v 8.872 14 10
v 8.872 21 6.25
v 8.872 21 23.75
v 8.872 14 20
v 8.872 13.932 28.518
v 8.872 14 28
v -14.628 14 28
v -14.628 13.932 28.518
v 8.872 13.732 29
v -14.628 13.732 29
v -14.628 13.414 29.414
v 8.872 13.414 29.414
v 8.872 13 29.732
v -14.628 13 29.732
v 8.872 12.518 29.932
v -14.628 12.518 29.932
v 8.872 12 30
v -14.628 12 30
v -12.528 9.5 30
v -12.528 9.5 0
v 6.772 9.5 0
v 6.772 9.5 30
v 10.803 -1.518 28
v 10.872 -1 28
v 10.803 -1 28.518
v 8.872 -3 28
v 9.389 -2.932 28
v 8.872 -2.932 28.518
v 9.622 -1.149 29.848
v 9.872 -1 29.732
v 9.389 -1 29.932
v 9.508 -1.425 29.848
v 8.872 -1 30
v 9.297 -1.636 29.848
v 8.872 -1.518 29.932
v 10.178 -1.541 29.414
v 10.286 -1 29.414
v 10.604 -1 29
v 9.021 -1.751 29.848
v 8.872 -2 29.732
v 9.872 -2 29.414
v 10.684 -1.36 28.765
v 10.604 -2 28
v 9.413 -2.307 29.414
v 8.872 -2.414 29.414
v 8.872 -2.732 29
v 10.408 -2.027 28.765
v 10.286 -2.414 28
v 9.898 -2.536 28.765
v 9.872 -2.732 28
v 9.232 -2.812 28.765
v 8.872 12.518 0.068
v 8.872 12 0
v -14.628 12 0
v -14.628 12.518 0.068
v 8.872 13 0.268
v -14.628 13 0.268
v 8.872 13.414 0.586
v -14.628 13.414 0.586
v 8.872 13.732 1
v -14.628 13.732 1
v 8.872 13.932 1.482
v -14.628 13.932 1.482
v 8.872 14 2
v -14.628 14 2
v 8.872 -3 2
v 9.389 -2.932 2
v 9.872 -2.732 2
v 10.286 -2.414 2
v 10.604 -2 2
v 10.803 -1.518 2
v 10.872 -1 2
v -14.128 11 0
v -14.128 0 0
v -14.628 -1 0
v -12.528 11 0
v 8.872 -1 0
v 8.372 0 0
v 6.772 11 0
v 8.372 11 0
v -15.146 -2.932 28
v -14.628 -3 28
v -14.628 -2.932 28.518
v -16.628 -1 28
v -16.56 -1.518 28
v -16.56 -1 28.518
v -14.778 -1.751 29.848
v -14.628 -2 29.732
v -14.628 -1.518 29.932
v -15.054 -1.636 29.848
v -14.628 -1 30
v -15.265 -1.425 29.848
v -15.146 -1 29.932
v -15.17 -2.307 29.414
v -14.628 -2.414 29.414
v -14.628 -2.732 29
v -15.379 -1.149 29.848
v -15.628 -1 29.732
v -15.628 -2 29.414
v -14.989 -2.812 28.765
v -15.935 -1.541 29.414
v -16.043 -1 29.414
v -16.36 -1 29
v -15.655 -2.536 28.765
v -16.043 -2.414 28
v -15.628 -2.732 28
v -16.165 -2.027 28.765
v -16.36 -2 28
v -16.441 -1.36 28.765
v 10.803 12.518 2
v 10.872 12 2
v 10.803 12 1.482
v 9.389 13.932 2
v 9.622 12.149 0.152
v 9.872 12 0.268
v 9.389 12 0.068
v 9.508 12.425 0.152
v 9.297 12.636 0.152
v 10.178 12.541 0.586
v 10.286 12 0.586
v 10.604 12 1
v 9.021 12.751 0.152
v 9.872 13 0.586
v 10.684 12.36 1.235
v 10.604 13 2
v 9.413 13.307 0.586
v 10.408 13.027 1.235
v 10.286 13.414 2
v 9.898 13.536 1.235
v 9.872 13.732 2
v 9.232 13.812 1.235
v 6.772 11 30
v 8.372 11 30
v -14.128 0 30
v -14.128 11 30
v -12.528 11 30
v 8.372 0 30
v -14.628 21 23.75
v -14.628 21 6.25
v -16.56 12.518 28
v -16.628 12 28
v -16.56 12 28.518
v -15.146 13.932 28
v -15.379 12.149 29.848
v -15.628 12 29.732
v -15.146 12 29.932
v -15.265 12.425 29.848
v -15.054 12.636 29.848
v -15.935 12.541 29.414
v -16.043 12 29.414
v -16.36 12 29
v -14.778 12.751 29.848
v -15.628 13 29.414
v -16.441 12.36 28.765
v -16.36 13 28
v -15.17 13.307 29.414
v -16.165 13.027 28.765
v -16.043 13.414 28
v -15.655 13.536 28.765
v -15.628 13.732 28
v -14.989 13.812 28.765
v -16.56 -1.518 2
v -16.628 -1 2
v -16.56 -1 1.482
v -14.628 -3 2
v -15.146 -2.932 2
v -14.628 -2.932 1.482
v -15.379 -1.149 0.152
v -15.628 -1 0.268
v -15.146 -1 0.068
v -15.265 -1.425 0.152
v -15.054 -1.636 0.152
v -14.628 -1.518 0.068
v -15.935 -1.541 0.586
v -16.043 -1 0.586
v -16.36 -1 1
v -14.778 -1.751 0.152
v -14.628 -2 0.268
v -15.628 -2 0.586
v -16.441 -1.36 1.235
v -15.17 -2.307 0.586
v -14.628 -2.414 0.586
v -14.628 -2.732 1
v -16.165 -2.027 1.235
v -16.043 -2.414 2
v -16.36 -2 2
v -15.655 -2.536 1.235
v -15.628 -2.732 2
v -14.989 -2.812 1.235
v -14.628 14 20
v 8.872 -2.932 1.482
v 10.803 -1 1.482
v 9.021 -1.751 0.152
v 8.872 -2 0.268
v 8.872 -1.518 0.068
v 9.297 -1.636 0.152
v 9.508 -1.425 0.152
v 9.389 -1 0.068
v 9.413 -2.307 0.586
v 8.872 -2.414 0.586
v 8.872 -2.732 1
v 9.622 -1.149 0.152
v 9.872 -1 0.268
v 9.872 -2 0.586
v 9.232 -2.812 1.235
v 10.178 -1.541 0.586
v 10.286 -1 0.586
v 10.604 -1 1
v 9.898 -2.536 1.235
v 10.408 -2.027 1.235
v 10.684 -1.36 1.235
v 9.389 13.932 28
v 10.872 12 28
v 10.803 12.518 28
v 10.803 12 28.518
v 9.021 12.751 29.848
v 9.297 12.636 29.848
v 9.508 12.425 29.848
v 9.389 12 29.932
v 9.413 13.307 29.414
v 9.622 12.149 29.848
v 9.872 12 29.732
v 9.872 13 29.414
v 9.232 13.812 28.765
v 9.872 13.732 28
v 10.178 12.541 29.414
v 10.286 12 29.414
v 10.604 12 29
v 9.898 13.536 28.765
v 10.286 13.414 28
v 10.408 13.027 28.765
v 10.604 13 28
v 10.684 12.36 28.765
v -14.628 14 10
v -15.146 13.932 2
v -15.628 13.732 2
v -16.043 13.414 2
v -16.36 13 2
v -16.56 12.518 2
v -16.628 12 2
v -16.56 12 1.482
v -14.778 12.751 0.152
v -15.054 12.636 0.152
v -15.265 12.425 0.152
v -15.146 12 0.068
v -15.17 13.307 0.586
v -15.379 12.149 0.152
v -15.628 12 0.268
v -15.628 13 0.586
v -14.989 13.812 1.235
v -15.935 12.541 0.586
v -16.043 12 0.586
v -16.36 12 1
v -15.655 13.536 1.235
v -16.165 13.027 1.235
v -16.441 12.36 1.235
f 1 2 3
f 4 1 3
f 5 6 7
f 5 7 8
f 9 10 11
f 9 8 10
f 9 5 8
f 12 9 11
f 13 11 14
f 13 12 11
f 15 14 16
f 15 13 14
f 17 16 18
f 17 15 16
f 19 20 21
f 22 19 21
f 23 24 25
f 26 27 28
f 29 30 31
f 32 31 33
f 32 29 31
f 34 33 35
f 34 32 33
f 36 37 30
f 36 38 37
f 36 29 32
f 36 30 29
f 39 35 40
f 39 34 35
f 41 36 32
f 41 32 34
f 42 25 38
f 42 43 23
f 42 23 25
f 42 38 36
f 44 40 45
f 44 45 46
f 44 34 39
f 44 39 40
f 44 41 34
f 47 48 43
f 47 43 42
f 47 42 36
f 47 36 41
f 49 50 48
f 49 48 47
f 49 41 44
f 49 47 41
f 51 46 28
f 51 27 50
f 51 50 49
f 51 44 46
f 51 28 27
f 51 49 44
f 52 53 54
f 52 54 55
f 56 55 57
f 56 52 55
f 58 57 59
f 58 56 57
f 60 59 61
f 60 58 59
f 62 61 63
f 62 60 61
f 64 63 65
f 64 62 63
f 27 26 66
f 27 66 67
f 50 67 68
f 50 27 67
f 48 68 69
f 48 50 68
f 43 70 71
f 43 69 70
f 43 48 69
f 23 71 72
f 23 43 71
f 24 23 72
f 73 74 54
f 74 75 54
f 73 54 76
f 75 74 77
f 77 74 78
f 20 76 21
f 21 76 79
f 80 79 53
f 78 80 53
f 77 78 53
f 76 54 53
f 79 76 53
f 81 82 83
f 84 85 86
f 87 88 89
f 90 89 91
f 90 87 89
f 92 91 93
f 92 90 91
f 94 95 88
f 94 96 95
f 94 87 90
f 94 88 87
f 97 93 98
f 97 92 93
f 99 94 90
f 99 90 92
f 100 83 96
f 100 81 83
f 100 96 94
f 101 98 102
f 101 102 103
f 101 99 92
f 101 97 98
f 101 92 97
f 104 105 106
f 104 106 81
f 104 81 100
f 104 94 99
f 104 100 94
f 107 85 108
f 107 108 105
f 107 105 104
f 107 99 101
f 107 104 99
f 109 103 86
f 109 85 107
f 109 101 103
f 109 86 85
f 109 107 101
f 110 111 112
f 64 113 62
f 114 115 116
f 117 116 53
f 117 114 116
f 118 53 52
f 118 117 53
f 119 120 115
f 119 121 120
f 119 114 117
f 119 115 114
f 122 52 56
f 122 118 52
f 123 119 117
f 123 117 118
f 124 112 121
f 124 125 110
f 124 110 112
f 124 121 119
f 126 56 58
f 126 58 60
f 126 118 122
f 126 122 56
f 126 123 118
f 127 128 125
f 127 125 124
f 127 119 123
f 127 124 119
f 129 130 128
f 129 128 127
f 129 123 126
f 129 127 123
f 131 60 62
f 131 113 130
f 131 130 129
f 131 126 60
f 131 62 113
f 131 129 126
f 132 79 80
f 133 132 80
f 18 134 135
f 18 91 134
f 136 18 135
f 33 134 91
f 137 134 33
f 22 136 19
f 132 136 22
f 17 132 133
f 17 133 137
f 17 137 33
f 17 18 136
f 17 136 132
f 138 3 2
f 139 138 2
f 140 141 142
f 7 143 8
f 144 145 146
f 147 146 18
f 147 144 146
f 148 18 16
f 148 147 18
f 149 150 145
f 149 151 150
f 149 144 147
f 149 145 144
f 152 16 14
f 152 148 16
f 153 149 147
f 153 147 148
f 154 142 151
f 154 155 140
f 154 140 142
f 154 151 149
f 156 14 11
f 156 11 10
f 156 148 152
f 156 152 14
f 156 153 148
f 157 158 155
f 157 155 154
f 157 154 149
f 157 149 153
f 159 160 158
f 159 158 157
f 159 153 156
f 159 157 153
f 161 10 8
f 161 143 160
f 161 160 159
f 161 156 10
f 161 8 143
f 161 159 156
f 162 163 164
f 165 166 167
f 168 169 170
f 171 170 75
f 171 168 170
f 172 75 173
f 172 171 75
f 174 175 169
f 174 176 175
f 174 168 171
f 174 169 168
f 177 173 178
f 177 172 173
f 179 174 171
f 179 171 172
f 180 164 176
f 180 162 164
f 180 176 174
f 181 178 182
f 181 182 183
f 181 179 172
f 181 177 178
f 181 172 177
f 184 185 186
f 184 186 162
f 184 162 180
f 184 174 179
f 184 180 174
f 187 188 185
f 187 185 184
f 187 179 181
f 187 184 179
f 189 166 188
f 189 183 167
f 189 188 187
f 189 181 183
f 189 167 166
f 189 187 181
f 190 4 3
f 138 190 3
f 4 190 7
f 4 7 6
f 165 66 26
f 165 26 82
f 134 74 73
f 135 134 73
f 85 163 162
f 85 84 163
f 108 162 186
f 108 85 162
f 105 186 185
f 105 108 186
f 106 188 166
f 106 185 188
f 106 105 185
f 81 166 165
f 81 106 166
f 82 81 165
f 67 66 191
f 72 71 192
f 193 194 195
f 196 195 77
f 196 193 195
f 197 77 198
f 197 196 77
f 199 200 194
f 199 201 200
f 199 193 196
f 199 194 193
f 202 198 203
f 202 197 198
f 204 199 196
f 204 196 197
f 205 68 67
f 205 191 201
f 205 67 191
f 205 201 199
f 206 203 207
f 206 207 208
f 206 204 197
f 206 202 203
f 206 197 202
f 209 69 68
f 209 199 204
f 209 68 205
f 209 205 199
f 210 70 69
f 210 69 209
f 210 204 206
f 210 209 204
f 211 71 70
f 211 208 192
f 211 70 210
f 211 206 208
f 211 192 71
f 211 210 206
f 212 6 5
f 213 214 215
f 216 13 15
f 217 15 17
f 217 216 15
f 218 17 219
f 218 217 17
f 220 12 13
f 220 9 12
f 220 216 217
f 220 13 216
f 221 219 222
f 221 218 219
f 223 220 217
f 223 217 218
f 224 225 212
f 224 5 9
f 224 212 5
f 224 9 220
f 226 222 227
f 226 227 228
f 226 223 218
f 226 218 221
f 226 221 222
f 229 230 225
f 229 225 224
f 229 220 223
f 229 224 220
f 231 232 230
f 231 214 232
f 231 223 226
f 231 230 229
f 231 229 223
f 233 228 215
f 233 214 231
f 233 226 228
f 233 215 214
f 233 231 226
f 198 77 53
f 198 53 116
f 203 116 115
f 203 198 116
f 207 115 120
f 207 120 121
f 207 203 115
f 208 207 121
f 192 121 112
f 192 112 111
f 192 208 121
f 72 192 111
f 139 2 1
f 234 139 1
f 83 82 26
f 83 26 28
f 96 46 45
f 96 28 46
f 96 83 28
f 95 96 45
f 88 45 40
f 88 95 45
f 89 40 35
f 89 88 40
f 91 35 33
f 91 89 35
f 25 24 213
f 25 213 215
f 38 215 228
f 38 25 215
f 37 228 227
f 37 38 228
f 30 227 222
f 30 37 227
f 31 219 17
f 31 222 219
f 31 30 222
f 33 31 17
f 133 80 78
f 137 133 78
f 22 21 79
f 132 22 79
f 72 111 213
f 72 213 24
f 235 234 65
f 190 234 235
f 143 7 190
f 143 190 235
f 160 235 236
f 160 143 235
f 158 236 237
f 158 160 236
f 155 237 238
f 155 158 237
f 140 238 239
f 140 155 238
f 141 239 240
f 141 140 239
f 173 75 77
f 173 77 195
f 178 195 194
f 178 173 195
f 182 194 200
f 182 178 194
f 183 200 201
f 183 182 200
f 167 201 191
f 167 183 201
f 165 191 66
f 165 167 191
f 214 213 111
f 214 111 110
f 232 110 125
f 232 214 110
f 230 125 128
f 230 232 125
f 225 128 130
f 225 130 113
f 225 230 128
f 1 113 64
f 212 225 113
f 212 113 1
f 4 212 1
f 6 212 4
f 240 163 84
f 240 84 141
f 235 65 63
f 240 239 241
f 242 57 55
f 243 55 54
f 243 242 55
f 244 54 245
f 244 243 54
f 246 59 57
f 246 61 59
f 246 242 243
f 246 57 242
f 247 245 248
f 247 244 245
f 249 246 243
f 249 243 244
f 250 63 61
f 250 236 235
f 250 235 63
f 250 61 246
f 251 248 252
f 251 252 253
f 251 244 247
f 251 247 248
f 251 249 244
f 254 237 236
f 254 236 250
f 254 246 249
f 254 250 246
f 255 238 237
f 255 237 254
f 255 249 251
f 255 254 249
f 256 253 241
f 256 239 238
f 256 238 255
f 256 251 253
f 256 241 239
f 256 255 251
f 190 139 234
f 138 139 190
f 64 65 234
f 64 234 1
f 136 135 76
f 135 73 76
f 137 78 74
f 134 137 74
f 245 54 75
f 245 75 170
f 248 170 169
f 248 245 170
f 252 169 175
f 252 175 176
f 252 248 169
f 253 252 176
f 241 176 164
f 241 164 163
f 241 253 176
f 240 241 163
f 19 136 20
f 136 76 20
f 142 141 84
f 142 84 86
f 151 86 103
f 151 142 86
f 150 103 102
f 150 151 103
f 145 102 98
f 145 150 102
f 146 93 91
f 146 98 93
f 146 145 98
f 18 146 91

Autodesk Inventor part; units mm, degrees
ref_plane "YZ Plane" through (0, 0, 0) normal (1, 0, 0) x (0, 1, 0)
ref_plane "XZ Plane" through (0, 0, 0) normal (0, 1, 0) x (-1, 0, 0)
ref_plane "XY Plane" through (0, 0, 0) normal (0, 0, 1) x (1, 0, 0)
sketch "Skizze1" plane through (0, 0, 0) normal (0, 0, 1) x (1, 0, 0)
  line L0 (-14.1284, 0) -> (-14.1284, 11)
  line L1 (-14.1284, 11) -> (-12.5284, 11)
  line L2 (-12.5284, 11) -> (-12.5284, 1.6)
  line L3 (-12.5284, 1.6) -> (6.7716, 1.6)
  line L4 (6.7716, 1.6) -> (6.7716, 11)
  line L5 (6.7716, 11) -> (8.3716, 11)
  line L6 (8.3716, 11) -> (8.3716, 0)
  line L7 (8.3716, 0) -> (-14.1284, 0)
  line L8 (-16.6284, 14) -> (10.8716, 14)
  line L9 (10.8716, 14) -> (10.8716, -3)
  line L10 (10.8716, -3) -> (-16.6284, -3)
  line L11 (-16.6284, -3) -> (-16.6284, 14)
  line L12 (-12.5284, 9.5) -> (6.7716, 9.5)
  point P0 (0, 0)
  dimension "d0" = 11
  dimension "d1" = 1.6
  dimension "d2" = 19.3
  dimension "d3" = 1.6
  dimension "d4" = 1.6
  dimension "d5" = 3
  dimension "d6" = 3
  dimension "d7" = 2.5
  dimension "d8" = 2.5
  dimension "d9" = 1.5
extrude "Extrusion1" add sketch "Skizze1" along normal blind 30
fillet "Rundung1" radius 2 12 edges at (10.8716, 14, 15) (10.8716, -3, 15) (-16.6284, -3, 15) (-16.6284, 14, 15) (-2.8784, 14, 30) (-16.6284, 5.5, 30) (-2.8784, -3, 30) (10.8716, 5.5, 30) (10.8716, 5.5, 0) (-2.8784, -3, 0) (-2.8784, 14, 0) (-16.6284, 5.5, 0)
sketch "Skizze2" plane through (10.8716, -1, 28) normal (1, 0, 0) x (0, 0, -1)
  line L0 (0, 15) -> (26, 15) projected
  line L1 (8, 15) -> (4.25, 22)
  line L2 (4.25, 22) -> (21.75, 22)
  line L3 (21.75, 22) -> (18, 15)
  line L4 (28, 0) -> (28, 13) projected
  point P0 (28, 1)
  dimension "d13" = 10
  dimension "d15" = 7
  dimension "d16" = 3.75
  dimension "d17" = 3.75
  dimension "d18" = 17.5
  dimension "d19" = 10
extrude "Extrusion2" add sketch "Skizze2" against normal blind 27.5
sketch "Skizze4" plane through (10.8716, 21, 23.75) normal (0, 1, 0) x (1, 0, 0)
  line L0 (-25.5, 21.75) -> (-25.5, -4.25) projected
  line L1 (-27.5, 3.75) -> (-27.5, 0) projected
  line L2 (-25.5, 17.5243) -> (-27.5, 17.5243)
  line L3 (-27.5, 17.5243) -> (-27.5, 0)
  line L4 (-27.5, 0) -> (-25.5, 0)
  line L5 (-25.5, 0) -> (-25.5, 17.5243)
  line L6 (0, 17.5) -> (-27.5, 17.5) projected
  line L7 (-2, 3.75) -> (-2, -4.25) projected
  line L8 (0, 17.5) -> (-2, 17.5)
  line L9 (-2, 17.5) -> (-2, 0)
  line L10 (-2, 0) -> (0, 0)
  line L11 (0, 0) -> (0, 17.5)
  point P0 (-10.8716, 23.75)
extrude "Extrusion4" cut sketch "Skizze4" against normal blind 7
properties part number "Schienenläufermitkeil_22.5"
